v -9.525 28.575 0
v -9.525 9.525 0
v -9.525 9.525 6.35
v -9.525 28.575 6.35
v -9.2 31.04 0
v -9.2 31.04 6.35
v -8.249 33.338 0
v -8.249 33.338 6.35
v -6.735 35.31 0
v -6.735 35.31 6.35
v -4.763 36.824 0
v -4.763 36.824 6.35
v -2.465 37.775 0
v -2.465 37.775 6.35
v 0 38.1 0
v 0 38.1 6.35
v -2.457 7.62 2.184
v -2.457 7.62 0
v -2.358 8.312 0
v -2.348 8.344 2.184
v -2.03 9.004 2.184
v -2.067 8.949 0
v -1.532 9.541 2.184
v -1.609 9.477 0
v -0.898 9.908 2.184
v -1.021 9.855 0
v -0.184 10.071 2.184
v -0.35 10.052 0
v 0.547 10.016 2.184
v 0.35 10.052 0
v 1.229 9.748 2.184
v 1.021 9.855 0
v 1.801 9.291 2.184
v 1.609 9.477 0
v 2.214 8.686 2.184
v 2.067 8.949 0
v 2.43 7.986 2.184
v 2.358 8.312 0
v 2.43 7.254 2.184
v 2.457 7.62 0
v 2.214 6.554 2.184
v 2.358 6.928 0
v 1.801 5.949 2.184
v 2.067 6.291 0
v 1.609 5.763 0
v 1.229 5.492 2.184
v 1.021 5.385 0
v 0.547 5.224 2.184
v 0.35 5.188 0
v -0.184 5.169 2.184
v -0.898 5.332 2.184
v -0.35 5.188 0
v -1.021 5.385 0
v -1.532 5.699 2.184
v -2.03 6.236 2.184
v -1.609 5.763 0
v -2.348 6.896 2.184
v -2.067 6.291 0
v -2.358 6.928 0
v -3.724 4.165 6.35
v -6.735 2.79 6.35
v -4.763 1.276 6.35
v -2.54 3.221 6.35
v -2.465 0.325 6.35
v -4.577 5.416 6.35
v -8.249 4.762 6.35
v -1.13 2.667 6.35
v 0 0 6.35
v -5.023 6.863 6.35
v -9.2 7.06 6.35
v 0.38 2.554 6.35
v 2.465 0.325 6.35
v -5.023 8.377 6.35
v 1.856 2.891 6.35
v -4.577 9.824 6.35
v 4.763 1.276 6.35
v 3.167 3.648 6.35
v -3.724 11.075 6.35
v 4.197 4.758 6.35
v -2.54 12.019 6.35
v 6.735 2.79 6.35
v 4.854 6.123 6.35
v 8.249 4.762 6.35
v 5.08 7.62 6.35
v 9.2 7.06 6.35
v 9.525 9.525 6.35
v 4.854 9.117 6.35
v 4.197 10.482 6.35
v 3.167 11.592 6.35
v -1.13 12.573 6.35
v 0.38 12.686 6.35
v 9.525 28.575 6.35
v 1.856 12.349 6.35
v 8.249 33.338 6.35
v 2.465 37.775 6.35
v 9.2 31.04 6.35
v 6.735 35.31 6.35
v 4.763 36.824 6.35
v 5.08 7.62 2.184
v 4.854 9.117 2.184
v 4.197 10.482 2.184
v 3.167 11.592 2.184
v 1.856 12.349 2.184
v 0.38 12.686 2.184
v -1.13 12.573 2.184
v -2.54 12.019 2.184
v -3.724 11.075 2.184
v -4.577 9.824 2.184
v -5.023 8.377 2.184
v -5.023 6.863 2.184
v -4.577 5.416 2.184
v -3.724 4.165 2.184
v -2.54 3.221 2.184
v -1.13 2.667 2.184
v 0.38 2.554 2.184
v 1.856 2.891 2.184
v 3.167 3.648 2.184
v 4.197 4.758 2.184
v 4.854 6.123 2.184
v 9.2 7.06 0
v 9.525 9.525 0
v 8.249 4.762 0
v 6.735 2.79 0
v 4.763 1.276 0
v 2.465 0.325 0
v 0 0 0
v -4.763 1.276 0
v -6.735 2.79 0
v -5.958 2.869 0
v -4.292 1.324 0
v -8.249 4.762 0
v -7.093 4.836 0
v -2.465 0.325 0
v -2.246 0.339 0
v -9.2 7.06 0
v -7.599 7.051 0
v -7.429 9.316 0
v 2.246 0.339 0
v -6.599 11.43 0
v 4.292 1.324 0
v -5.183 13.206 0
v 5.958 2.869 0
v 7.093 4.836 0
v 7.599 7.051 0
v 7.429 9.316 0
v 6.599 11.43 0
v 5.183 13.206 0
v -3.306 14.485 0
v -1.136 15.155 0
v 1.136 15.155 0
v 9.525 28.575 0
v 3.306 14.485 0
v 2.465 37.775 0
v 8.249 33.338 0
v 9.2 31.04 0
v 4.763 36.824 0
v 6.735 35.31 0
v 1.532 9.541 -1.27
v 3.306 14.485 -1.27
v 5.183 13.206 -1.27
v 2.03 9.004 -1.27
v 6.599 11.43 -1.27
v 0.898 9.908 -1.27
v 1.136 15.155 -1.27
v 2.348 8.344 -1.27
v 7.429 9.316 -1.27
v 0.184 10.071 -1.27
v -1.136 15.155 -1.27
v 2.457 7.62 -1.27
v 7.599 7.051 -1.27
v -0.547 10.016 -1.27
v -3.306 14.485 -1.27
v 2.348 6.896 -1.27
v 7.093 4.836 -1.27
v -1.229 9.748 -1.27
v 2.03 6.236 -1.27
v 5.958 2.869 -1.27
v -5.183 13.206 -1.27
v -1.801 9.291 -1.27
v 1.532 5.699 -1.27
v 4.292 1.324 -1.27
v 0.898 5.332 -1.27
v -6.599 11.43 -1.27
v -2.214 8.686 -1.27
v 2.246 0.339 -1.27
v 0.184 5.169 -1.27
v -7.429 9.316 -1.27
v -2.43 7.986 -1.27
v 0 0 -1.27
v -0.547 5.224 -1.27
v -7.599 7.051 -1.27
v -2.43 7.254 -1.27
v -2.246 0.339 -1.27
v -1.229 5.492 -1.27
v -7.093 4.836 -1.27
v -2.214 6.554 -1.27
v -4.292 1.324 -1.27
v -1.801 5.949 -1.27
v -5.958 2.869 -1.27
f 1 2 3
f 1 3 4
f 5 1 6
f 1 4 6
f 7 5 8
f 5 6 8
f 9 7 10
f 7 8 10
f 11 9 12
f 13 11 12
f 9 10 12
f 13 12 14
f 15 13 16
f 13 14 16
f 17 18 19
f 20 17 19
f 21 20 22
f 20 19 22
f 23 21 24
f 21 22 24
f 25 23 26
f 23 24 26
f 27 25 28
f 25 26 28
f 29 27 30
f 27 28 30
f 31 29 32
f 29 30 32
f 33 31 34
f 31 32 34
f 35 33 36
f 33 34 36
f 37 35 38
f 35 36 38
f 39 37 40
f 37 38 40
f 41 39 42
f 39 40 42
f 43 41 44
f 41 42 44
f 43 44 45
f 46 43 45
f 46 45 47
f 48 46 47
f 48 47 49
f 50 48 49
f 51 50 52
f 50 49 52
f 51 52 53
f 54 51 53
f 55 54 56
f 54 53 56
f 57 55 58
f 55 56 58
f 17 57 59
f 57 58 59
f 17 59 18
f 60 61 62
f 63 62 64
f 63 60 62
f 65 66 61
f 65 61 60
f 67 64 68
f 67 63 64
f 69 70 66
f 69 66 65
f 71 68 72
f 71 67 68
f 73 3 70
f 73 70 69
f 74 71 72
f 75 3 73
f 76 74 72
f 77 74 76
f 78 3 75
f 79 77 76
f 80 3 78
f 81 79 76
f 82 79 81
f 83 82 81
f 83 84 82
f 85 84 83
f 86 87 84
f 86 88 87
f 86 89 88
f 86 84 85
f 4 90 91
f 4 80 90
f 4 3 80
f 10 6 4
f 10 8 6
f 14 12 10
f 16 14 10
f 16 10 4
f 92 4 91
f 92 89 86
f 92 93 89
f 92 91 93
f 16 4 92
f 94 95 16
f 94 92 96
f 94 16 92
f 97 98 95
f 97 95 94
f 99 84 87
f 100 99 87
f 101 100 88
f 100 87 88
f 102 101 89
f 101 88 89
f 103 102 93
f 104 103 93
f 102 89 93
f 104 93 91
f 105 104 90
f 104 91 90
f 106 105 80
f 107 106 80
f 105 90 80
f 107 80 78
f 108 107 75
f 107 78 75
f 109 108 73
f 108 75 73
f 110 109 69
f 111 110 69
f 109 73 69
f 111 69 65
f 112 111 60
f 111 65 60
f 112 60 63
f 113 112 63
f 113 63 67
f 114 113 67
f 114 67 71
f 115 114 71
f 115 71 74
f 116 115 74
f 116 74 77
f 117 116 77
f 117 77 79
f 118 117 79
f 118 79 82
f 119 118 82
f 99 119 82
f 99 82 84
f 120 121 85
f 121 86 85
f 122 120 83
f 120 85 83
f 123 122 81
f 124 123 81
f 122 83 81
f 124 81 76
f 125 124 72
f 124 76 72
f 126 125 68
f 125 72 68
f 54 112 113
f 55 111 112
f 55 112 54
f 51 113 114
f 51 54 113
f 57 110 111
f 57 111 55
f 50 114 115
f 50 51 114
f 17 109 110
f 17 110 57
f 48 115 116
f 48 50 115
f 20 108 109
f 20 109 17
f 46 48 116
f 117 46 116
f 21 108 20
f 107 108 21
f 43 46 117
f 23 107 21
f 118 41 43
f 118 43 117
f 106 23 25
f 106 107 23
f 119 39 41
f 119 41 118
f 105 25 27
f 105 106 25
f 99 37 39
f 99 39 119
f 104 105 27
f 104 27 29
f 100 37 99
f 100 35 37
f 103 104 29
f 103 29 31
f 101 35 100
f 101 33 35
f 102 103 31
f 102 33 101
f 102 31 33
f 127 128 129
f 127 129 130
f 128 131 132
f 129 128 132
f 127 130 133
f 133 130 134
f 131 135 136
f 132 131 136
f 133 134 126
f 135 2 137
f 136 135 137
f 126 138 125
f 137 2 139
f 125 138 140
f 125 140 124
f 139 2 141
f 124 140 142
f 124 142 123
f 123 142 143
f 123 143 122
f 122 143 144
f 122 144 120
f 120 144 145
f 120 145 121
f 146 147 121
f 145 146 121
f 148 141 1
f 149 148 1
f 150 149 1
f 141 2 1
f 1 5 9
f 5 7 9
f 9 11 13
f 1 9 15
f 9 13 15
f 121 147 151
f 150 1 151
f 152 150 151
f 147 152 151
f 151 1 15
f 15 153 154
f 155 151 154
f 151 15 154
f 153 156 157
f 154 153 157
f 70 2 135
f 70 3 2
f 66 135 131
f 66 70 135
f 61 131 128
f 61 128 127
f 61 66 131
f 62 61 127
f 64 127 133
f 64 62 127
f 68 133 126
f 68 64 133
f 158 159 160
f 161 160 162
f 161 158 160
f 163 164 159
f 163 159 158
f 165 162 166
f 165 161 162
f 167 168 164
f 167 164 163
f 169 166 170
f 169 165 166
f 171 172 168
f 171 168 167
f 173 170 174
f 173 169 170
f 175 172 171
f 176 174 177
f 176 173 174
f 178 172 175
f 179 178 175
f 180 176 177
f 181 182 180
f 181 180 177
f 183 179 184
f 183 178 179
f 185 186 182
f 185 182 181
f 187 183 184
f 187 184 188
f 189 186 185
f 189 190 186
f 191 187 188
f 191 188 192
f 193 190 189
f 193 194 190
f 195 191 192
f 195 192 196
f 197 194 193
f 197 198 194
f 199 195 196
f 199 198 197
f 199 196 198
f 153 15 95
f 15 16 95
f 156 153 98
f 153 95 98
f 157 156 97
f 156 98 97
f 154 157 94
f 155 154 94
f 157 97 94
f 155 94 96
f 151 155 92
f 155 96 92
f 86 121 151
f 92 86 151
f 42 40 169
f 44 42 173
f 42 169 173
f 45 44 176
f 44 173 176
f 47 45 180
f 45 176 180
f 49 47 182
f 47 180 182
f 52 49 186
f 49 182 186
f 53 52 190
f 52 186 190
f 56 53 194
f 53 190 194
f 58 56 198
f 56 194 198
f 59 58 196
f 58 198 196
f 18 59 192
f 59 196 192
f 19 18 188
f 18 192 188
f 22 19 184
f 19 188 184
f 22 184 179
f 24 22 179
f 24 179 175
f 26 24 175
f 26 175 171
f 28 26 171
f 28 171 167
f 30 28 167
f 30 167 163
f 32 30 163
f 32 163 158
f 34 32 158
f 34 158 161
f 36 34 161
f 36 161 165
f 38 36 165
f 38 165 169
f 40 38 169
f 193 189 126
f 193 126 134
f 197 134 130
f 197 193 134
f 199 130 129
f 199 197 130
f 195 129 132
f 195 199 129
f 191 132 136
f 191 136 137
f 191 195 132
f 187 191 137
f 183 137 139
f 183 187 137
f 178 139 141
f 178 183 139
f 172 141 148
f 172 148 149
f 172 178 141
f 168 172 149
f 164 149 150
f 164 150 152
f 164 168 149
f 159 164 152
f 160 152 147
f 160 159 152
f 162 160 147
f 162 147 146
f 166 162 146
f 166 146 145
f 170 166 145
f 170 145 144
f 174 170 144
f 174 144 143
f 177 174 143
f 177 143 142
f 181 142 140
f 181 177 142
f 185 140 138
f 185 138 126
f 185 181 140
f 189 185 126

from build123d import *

# Parameters (mm, degrees)
SKETCH1_W                                      = 19.05
SKETCH1_H                                      = 38.1
BOSS_EXTRUDE1_DEPTH                            = 6.35
CBORE_FOR_8_SOCKET_HEAD_CAP_SCREW1_D           = 4.9149
CBORE_FOR_8_SOCKET_HEAD_CAP_SCREW1_CBORE_D     = 10.16
CBORE_FOR_8_SOCKET_HEAD_CAP_SCREW1_CBORE_DEPTH = 4.1656
BOSS_EXTRUDE2_START                            = 1.27
SKETCH4_R                                      = 7.62
SKETCH4_R_2                                    = 2.45745
BOSS_EXTRUDE2_DEPTH                            = 1.27
FILLET1_R                                      = 9.525


with BuildPart() as part:
    # Sketch1 → Boss-Extrude1 (new body)
    with BuildSketch(Plane.XY):
        with Locations((0, 19.05)):
            Rectangle(SKETCH1_W, SKETCH1_H)
    extrude(amount=BOSS_EXTRUDE1_DEPTH)

    # CBORE for #8 Socket Head Cap Screw1 (through all)
    with Locations(Plane.XY.offset(6.35)):
        with Locations((0, 7.62)):
            CounterBoreHole(CBORE_FOR_8_SOCKET_HEAD_CAP_SCREW1_D / 2, CBORE_FOR_8_SOCKET_HEAD_CAP_SCREW1_CBORE_D / 2, CBORE_FOR_8_SOCKET_HEAD_CAP_SCREW1_CBORE_DEPTH)

    # Sketch4 → Boss-Extrude2 (add)
    with BuildSketch(Plane(origin=(0, 0, 0), x_dir=(-1, 0, 0), z_dir=(0, 0, -1)).offset(BOSS_EXTRUDE2_START)):
        with Locations(Location((0, 7.62, 0), (0, 0, 270))):
            Circle(SKETCH4_R)
        with Locations(Location((0, 7.62, 0), (0, 0, 180))):
            Circle(SKETCH4_R_2, mode=Mode.SUBTRACT)
    extrude(amount=-BOSS_EXTRUDE2_DEPTH)

    # Fillet1
    fillet1_edges = [part.edges().sort_by_distance(p)[0] for p in [
        (9.525, 38.1, 3.175),
        (-9.525, 38.1, 3.175),
        (9.525, 0, 3.175),
        (-9.525, 0, 3.175),
    ]]
    fillet(fillet1_edges, radius=FILLET1_R - 0.0001)  # a hair under: the kernel refuses the full size


solid = part.part
